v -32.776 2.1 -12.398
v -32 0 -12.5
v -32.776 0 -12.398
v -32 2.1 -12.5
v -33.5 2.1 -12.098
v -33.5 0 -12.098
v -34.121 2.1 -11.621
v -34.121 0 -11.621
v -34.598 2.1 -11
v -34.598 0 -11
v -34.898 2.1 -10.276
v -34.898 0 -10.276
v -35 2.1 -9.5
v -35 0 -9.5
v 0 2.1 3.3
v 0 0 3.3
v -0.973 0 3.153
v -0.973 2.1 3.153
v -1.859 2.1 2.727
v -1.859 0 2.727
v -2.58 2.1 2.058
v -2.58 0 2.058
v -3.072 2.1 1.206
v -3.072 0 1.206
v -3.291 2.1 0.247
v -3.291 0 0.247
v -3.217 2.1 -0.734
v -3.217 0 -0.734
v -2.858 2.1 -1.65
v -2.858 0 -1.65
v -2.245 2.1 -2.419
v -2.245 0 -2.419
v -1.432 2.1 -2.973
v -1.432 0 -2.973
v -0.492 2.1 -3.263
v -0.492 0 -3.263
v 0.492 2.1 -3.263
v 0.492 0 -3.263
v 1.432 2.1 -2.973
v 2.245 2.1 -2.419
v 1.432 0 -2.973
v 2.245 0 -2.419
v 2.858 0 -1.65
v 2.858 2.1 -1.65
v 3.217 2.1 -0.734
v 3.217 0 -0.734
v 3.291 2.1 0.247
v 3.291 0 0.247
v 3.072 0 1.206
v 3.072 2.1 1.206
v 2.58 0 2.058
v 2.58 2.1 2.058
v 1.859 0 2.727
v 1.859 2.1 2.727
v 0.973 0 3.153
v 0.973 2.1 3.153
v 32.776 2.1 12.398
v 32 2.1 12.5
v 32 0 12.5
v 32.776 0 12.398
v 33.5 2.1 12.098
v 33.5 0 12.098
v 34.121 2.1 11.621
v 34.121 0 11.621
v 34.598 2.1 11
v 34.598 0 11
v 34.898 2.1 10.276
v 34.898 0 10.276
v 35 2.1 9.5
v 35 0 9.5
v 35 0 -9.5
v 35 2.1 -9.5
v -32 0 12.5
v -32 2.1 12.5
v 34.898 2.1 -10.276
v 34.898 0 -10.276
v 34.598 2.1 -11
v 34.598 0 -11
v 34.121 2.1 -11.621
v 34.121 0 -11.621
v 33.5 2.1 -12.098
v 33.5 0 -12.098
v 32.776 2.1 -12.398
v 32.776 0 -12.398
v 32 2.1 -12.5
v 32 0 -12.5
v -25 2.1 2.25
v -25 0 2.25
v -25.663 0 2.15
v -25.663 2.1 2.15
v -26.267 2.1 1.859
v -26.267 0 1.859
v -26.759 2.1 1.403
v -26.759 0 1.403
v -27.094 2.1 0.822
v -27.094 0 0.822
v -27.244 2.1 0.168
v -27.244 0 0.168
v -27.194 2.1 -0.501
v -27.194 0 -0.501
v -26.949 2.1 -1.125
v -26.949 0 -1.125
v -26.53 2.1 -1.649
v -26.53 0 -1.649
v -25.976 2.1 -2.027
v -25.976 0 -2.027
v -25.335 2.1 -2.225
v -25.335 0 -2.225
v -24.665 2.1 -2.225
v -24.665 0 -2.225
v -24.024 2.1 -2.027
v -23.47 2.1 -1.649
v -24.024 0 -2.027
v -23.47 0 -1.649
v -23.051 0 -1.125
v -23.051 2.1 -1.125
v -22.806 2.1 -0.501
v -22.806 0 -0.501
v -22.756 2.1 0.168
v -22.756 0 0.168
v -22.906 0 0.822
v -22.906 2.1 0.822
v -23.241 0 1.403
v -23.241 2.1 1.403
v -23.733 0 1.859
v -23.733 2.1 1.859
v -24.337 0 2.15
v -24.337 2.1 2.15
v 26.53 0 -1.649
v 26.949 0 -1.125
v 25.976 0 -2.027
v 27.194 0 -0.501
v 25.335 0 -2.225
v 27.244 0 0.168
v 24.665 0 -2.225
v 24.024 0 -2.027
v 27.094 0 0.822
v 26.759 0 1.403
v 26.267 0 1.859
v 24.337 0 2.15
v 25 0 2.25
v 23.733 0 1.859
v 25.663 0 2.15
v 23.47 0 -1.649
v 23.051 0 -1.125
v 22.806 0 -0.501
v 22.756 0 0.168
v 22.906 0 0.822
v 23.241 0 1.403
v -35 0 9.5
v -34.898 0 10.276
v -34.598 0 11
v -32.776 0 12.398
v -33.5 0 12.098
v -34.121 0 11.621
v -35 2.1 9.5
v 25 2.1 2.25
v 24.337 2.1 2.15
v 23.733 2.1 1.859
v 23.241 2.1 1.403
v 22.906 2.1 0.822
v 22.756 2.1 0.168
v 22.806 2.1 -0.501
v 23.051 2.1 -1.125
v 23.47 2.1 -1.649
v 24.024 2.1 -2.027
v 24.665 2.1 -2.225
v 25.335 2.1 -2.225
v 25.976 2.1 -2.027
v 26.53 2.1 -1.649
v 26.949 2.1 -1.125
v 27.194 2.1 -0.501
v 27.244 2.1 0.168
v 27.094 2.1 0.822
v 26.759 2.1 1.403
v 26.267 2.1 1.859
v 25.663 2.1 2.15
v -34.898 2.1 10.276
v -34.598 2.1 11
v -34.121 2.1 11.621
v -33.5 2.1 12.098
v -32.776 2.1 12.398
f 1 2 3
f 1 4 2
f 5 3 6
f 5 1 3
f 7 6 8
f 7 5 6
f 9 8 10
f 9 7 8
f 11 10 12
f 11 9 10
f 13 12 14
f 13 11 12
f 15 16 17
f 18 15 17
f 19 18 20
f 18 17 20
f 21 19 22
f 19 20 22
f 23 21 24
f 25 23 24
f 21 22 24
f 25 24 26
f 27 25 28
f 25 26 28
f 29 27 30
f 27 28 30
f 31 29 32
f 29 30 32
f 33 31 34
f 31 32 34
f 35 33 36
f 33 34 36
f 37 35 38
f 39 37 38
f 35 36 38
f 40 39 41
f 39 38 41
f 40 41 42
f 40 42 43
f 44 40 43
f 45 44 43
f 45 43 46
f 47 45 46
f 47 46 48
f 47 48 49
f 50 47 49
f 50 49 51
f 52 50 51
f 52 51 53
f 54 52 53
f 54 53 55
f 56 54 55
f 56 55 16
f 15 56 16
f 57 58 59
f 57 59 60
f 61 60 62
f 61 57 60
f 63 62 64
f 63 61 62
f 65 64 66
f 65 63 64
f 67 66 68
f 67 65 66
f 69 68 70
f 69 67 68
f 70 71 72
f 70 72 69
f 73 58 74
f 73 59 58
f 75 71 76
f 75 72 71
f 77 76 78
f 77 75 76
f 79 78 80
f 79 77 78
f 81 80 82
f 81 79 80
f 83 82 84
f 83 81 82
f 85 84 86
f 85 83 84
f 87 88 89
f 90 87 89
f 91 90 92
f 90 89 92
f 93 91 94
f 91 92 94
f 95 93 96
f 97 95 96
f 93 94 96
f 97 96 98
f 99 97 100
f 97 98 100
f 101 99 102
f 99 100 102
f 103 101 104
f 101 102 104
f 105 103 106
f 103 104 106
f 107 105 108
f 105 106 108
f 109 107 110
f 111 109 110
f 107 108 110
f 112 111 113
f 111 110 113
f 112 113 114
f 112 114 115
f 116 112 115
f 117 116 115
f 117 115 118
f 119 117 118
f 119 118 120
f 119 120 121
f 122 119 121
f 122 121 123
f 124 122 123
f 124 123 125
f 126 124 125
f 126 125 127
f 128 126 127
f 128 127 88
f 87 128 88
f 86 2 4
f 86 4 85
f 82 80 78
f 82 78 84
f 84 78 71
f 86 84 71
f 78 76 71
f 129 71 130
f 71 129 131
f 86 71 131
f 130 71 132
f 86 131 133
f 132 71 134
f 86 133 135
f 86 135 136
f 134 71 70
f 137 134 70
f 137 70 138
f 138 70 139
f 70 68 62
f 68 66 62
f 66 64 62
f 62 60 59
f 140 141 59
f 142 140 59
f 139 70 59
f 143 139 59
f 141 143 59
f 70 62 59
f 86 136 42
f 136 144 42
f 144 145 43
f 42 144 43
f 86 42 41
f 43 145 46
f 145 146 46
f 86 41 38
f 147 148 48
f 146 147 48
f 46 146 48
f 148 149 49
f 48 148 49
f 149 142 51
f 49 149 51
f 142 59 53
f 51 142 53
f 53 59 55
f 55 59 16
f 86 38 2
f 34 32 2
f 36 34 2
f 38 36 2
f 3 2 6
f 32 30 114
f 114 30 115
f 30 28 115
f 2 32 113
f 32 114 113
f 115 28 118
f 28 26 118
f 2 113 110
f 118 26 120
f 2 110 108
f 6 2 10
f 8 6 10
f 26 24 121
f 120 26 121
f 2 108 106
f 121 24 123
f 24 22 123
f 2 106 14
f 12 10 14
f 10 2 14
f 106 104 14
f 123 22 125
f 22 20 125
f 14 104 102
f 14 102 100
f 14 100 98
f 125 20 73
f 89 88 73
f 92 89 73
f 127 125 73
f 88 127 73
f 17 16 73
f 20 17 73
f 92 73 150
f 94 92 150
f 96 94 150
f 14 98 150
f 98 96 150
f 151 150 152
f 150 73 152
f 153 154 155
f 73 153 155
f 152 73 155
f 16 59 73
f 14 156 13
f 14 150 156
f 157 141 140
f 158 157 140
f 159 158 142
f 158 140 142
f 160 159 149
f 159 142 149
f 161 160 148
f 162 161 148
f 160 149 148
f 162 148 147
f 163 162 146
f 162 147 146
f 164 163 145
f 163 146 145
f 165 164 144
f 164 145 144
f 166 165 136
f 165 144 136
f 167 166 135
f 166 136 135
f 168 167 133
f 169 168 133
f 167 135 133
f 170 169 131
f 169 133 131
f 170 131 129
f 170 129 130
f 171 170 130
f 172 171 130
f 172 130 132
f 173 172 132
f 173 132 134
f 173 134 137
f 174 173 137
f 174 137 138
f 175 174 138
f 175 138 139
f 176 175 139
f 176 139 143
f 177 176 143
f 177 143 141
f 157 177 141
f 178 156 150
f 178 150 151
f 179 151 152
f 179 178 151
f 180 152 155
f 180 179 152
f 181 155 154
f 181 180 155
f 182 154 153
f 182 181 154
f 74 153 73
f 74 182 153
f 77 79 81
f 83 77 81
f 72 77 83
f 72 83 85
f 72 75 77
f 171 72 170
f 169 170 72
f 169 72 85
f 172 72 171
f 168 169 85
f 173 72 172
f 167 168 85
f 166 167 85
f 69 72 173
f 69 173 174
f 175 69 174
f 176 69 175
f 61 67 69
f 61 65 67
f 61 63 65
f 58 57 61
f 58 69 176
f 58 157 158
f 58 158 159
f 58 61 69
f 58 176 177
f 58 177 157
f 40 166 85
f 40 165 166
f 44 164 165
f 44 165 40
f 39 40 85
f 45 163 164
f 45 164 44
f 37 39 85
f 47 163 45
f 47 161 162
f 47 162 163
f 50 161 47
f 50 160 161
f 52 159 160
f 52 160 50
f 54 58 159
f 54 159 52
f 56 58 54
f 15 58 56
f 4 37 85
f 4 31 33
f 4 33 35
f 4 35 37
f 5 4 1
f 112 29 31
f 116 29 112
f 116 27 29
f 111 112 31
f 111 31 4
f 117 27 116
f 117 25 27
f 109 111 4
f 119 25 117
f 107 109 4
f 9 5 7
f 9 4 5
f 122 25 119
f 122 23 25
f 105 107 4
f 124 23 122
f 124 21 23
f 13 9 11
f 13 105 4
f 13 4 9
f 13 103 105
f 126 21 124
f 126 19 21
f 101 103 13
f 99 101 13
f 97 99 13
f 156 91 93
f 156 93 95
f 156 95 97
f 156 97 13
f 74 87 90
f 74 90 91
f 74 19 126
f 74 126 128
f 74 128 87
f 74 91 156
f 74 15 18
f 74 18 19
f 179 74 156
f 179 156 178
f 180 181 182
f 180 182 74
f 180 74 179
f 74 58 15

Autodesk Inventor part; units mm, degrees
ref_plane "YZ Plane" through (0, 0, 0) normal (1, 0, 0) x (0, 1, 0)
ref_plane "XZ Plane" through (0, 0, 0) normal (0, 1, 0) x (-1, 0, 0)
ref_plane "XY Plane" through (0, 0, 0) normal (0, 0, 1) x (1, 0, 0)
sketch "Sketch1" plane through (0, 0, 0) normal (0, 1, 0) x (-1, 0, 0)
  line L0 (35, -12.5) -> (-35, -12.5)
  line L1 (-35, -12.5) -> (-35, 12.5)
  line L2 (-35, 12.5) -> (35, 12.5)
  line L3 (35, 12.5) -> (35, -12.5)
  line L4 (35, -12.5) -> (-35, 12.5) construction
  line L5 (-35, -12.5) -> (35, 12.5) construction
  point P0 (0, 0)
  point P1 (0, 0)
  dimension "d19" = 25
  dimension "d21" = 70
extrude "Plate1" add sketch "Sketch1" along normal blind 2.1
sketch "Sketch2" plane through (0, 2.1, 0) normal (0, 1, 0) x (1, 0, 0)
  line L0 (0, 0) -> (-25, 0)
  line L1 (0, 0) -> (0, 5)
  point P0 (25, 0)
  point P1 (25, 0)
  dimension "d3" = 25
  dimension "d4" = 5
hole "Hole1" at (0, 2.1, 0) direction (0, -1, 0) diameter 6.6 depth 2.1 clearance for "Countersunk Flat Head Screw ISO 2009/7046" size "M6" standard "ISO"
hole "Hole2" at (-25, 2.1, 0) at (25, 2.1, 0) direction (0, -1, 0) diameter 4.5 depth 2.1 clearance for "Countersunk Flat Head Screw ISO 2009/7046" size "M4" standard "ISO"
fillet "Corner Round1" radius 3 4 edges at (-35, 1.05, 12.5) (35, 1.05, 12.5) (35, 1.05, -12.5) (-35, 1.05, -12.5)
equation "\"d10\" = Thickness"
equation "\"d17\" = Thickness"
equation "\"d2\" = Thickness"
equation "\"BendReliefWidth\" = Thickness"
equation "\"BendReliefDepth\" = 0.5 * Thickness"
equation "\"CornerReliefSize\" = 4 * Thickness"
equation "\"MinimumRemnant\" = 2 * Thickness"
equation "\"TransitionRadius\" = BendRadius"
equation "\"JacobiRadiusSize\" = BendRadius"
equation "\"GapSize\" = Thickness"
equation "\"Thickness\" = 2.1"
equation "\"BendRadius\" = 1.512"
properties part number "SP58V1 Seguro Pedales" material "Steel, Carbon"
